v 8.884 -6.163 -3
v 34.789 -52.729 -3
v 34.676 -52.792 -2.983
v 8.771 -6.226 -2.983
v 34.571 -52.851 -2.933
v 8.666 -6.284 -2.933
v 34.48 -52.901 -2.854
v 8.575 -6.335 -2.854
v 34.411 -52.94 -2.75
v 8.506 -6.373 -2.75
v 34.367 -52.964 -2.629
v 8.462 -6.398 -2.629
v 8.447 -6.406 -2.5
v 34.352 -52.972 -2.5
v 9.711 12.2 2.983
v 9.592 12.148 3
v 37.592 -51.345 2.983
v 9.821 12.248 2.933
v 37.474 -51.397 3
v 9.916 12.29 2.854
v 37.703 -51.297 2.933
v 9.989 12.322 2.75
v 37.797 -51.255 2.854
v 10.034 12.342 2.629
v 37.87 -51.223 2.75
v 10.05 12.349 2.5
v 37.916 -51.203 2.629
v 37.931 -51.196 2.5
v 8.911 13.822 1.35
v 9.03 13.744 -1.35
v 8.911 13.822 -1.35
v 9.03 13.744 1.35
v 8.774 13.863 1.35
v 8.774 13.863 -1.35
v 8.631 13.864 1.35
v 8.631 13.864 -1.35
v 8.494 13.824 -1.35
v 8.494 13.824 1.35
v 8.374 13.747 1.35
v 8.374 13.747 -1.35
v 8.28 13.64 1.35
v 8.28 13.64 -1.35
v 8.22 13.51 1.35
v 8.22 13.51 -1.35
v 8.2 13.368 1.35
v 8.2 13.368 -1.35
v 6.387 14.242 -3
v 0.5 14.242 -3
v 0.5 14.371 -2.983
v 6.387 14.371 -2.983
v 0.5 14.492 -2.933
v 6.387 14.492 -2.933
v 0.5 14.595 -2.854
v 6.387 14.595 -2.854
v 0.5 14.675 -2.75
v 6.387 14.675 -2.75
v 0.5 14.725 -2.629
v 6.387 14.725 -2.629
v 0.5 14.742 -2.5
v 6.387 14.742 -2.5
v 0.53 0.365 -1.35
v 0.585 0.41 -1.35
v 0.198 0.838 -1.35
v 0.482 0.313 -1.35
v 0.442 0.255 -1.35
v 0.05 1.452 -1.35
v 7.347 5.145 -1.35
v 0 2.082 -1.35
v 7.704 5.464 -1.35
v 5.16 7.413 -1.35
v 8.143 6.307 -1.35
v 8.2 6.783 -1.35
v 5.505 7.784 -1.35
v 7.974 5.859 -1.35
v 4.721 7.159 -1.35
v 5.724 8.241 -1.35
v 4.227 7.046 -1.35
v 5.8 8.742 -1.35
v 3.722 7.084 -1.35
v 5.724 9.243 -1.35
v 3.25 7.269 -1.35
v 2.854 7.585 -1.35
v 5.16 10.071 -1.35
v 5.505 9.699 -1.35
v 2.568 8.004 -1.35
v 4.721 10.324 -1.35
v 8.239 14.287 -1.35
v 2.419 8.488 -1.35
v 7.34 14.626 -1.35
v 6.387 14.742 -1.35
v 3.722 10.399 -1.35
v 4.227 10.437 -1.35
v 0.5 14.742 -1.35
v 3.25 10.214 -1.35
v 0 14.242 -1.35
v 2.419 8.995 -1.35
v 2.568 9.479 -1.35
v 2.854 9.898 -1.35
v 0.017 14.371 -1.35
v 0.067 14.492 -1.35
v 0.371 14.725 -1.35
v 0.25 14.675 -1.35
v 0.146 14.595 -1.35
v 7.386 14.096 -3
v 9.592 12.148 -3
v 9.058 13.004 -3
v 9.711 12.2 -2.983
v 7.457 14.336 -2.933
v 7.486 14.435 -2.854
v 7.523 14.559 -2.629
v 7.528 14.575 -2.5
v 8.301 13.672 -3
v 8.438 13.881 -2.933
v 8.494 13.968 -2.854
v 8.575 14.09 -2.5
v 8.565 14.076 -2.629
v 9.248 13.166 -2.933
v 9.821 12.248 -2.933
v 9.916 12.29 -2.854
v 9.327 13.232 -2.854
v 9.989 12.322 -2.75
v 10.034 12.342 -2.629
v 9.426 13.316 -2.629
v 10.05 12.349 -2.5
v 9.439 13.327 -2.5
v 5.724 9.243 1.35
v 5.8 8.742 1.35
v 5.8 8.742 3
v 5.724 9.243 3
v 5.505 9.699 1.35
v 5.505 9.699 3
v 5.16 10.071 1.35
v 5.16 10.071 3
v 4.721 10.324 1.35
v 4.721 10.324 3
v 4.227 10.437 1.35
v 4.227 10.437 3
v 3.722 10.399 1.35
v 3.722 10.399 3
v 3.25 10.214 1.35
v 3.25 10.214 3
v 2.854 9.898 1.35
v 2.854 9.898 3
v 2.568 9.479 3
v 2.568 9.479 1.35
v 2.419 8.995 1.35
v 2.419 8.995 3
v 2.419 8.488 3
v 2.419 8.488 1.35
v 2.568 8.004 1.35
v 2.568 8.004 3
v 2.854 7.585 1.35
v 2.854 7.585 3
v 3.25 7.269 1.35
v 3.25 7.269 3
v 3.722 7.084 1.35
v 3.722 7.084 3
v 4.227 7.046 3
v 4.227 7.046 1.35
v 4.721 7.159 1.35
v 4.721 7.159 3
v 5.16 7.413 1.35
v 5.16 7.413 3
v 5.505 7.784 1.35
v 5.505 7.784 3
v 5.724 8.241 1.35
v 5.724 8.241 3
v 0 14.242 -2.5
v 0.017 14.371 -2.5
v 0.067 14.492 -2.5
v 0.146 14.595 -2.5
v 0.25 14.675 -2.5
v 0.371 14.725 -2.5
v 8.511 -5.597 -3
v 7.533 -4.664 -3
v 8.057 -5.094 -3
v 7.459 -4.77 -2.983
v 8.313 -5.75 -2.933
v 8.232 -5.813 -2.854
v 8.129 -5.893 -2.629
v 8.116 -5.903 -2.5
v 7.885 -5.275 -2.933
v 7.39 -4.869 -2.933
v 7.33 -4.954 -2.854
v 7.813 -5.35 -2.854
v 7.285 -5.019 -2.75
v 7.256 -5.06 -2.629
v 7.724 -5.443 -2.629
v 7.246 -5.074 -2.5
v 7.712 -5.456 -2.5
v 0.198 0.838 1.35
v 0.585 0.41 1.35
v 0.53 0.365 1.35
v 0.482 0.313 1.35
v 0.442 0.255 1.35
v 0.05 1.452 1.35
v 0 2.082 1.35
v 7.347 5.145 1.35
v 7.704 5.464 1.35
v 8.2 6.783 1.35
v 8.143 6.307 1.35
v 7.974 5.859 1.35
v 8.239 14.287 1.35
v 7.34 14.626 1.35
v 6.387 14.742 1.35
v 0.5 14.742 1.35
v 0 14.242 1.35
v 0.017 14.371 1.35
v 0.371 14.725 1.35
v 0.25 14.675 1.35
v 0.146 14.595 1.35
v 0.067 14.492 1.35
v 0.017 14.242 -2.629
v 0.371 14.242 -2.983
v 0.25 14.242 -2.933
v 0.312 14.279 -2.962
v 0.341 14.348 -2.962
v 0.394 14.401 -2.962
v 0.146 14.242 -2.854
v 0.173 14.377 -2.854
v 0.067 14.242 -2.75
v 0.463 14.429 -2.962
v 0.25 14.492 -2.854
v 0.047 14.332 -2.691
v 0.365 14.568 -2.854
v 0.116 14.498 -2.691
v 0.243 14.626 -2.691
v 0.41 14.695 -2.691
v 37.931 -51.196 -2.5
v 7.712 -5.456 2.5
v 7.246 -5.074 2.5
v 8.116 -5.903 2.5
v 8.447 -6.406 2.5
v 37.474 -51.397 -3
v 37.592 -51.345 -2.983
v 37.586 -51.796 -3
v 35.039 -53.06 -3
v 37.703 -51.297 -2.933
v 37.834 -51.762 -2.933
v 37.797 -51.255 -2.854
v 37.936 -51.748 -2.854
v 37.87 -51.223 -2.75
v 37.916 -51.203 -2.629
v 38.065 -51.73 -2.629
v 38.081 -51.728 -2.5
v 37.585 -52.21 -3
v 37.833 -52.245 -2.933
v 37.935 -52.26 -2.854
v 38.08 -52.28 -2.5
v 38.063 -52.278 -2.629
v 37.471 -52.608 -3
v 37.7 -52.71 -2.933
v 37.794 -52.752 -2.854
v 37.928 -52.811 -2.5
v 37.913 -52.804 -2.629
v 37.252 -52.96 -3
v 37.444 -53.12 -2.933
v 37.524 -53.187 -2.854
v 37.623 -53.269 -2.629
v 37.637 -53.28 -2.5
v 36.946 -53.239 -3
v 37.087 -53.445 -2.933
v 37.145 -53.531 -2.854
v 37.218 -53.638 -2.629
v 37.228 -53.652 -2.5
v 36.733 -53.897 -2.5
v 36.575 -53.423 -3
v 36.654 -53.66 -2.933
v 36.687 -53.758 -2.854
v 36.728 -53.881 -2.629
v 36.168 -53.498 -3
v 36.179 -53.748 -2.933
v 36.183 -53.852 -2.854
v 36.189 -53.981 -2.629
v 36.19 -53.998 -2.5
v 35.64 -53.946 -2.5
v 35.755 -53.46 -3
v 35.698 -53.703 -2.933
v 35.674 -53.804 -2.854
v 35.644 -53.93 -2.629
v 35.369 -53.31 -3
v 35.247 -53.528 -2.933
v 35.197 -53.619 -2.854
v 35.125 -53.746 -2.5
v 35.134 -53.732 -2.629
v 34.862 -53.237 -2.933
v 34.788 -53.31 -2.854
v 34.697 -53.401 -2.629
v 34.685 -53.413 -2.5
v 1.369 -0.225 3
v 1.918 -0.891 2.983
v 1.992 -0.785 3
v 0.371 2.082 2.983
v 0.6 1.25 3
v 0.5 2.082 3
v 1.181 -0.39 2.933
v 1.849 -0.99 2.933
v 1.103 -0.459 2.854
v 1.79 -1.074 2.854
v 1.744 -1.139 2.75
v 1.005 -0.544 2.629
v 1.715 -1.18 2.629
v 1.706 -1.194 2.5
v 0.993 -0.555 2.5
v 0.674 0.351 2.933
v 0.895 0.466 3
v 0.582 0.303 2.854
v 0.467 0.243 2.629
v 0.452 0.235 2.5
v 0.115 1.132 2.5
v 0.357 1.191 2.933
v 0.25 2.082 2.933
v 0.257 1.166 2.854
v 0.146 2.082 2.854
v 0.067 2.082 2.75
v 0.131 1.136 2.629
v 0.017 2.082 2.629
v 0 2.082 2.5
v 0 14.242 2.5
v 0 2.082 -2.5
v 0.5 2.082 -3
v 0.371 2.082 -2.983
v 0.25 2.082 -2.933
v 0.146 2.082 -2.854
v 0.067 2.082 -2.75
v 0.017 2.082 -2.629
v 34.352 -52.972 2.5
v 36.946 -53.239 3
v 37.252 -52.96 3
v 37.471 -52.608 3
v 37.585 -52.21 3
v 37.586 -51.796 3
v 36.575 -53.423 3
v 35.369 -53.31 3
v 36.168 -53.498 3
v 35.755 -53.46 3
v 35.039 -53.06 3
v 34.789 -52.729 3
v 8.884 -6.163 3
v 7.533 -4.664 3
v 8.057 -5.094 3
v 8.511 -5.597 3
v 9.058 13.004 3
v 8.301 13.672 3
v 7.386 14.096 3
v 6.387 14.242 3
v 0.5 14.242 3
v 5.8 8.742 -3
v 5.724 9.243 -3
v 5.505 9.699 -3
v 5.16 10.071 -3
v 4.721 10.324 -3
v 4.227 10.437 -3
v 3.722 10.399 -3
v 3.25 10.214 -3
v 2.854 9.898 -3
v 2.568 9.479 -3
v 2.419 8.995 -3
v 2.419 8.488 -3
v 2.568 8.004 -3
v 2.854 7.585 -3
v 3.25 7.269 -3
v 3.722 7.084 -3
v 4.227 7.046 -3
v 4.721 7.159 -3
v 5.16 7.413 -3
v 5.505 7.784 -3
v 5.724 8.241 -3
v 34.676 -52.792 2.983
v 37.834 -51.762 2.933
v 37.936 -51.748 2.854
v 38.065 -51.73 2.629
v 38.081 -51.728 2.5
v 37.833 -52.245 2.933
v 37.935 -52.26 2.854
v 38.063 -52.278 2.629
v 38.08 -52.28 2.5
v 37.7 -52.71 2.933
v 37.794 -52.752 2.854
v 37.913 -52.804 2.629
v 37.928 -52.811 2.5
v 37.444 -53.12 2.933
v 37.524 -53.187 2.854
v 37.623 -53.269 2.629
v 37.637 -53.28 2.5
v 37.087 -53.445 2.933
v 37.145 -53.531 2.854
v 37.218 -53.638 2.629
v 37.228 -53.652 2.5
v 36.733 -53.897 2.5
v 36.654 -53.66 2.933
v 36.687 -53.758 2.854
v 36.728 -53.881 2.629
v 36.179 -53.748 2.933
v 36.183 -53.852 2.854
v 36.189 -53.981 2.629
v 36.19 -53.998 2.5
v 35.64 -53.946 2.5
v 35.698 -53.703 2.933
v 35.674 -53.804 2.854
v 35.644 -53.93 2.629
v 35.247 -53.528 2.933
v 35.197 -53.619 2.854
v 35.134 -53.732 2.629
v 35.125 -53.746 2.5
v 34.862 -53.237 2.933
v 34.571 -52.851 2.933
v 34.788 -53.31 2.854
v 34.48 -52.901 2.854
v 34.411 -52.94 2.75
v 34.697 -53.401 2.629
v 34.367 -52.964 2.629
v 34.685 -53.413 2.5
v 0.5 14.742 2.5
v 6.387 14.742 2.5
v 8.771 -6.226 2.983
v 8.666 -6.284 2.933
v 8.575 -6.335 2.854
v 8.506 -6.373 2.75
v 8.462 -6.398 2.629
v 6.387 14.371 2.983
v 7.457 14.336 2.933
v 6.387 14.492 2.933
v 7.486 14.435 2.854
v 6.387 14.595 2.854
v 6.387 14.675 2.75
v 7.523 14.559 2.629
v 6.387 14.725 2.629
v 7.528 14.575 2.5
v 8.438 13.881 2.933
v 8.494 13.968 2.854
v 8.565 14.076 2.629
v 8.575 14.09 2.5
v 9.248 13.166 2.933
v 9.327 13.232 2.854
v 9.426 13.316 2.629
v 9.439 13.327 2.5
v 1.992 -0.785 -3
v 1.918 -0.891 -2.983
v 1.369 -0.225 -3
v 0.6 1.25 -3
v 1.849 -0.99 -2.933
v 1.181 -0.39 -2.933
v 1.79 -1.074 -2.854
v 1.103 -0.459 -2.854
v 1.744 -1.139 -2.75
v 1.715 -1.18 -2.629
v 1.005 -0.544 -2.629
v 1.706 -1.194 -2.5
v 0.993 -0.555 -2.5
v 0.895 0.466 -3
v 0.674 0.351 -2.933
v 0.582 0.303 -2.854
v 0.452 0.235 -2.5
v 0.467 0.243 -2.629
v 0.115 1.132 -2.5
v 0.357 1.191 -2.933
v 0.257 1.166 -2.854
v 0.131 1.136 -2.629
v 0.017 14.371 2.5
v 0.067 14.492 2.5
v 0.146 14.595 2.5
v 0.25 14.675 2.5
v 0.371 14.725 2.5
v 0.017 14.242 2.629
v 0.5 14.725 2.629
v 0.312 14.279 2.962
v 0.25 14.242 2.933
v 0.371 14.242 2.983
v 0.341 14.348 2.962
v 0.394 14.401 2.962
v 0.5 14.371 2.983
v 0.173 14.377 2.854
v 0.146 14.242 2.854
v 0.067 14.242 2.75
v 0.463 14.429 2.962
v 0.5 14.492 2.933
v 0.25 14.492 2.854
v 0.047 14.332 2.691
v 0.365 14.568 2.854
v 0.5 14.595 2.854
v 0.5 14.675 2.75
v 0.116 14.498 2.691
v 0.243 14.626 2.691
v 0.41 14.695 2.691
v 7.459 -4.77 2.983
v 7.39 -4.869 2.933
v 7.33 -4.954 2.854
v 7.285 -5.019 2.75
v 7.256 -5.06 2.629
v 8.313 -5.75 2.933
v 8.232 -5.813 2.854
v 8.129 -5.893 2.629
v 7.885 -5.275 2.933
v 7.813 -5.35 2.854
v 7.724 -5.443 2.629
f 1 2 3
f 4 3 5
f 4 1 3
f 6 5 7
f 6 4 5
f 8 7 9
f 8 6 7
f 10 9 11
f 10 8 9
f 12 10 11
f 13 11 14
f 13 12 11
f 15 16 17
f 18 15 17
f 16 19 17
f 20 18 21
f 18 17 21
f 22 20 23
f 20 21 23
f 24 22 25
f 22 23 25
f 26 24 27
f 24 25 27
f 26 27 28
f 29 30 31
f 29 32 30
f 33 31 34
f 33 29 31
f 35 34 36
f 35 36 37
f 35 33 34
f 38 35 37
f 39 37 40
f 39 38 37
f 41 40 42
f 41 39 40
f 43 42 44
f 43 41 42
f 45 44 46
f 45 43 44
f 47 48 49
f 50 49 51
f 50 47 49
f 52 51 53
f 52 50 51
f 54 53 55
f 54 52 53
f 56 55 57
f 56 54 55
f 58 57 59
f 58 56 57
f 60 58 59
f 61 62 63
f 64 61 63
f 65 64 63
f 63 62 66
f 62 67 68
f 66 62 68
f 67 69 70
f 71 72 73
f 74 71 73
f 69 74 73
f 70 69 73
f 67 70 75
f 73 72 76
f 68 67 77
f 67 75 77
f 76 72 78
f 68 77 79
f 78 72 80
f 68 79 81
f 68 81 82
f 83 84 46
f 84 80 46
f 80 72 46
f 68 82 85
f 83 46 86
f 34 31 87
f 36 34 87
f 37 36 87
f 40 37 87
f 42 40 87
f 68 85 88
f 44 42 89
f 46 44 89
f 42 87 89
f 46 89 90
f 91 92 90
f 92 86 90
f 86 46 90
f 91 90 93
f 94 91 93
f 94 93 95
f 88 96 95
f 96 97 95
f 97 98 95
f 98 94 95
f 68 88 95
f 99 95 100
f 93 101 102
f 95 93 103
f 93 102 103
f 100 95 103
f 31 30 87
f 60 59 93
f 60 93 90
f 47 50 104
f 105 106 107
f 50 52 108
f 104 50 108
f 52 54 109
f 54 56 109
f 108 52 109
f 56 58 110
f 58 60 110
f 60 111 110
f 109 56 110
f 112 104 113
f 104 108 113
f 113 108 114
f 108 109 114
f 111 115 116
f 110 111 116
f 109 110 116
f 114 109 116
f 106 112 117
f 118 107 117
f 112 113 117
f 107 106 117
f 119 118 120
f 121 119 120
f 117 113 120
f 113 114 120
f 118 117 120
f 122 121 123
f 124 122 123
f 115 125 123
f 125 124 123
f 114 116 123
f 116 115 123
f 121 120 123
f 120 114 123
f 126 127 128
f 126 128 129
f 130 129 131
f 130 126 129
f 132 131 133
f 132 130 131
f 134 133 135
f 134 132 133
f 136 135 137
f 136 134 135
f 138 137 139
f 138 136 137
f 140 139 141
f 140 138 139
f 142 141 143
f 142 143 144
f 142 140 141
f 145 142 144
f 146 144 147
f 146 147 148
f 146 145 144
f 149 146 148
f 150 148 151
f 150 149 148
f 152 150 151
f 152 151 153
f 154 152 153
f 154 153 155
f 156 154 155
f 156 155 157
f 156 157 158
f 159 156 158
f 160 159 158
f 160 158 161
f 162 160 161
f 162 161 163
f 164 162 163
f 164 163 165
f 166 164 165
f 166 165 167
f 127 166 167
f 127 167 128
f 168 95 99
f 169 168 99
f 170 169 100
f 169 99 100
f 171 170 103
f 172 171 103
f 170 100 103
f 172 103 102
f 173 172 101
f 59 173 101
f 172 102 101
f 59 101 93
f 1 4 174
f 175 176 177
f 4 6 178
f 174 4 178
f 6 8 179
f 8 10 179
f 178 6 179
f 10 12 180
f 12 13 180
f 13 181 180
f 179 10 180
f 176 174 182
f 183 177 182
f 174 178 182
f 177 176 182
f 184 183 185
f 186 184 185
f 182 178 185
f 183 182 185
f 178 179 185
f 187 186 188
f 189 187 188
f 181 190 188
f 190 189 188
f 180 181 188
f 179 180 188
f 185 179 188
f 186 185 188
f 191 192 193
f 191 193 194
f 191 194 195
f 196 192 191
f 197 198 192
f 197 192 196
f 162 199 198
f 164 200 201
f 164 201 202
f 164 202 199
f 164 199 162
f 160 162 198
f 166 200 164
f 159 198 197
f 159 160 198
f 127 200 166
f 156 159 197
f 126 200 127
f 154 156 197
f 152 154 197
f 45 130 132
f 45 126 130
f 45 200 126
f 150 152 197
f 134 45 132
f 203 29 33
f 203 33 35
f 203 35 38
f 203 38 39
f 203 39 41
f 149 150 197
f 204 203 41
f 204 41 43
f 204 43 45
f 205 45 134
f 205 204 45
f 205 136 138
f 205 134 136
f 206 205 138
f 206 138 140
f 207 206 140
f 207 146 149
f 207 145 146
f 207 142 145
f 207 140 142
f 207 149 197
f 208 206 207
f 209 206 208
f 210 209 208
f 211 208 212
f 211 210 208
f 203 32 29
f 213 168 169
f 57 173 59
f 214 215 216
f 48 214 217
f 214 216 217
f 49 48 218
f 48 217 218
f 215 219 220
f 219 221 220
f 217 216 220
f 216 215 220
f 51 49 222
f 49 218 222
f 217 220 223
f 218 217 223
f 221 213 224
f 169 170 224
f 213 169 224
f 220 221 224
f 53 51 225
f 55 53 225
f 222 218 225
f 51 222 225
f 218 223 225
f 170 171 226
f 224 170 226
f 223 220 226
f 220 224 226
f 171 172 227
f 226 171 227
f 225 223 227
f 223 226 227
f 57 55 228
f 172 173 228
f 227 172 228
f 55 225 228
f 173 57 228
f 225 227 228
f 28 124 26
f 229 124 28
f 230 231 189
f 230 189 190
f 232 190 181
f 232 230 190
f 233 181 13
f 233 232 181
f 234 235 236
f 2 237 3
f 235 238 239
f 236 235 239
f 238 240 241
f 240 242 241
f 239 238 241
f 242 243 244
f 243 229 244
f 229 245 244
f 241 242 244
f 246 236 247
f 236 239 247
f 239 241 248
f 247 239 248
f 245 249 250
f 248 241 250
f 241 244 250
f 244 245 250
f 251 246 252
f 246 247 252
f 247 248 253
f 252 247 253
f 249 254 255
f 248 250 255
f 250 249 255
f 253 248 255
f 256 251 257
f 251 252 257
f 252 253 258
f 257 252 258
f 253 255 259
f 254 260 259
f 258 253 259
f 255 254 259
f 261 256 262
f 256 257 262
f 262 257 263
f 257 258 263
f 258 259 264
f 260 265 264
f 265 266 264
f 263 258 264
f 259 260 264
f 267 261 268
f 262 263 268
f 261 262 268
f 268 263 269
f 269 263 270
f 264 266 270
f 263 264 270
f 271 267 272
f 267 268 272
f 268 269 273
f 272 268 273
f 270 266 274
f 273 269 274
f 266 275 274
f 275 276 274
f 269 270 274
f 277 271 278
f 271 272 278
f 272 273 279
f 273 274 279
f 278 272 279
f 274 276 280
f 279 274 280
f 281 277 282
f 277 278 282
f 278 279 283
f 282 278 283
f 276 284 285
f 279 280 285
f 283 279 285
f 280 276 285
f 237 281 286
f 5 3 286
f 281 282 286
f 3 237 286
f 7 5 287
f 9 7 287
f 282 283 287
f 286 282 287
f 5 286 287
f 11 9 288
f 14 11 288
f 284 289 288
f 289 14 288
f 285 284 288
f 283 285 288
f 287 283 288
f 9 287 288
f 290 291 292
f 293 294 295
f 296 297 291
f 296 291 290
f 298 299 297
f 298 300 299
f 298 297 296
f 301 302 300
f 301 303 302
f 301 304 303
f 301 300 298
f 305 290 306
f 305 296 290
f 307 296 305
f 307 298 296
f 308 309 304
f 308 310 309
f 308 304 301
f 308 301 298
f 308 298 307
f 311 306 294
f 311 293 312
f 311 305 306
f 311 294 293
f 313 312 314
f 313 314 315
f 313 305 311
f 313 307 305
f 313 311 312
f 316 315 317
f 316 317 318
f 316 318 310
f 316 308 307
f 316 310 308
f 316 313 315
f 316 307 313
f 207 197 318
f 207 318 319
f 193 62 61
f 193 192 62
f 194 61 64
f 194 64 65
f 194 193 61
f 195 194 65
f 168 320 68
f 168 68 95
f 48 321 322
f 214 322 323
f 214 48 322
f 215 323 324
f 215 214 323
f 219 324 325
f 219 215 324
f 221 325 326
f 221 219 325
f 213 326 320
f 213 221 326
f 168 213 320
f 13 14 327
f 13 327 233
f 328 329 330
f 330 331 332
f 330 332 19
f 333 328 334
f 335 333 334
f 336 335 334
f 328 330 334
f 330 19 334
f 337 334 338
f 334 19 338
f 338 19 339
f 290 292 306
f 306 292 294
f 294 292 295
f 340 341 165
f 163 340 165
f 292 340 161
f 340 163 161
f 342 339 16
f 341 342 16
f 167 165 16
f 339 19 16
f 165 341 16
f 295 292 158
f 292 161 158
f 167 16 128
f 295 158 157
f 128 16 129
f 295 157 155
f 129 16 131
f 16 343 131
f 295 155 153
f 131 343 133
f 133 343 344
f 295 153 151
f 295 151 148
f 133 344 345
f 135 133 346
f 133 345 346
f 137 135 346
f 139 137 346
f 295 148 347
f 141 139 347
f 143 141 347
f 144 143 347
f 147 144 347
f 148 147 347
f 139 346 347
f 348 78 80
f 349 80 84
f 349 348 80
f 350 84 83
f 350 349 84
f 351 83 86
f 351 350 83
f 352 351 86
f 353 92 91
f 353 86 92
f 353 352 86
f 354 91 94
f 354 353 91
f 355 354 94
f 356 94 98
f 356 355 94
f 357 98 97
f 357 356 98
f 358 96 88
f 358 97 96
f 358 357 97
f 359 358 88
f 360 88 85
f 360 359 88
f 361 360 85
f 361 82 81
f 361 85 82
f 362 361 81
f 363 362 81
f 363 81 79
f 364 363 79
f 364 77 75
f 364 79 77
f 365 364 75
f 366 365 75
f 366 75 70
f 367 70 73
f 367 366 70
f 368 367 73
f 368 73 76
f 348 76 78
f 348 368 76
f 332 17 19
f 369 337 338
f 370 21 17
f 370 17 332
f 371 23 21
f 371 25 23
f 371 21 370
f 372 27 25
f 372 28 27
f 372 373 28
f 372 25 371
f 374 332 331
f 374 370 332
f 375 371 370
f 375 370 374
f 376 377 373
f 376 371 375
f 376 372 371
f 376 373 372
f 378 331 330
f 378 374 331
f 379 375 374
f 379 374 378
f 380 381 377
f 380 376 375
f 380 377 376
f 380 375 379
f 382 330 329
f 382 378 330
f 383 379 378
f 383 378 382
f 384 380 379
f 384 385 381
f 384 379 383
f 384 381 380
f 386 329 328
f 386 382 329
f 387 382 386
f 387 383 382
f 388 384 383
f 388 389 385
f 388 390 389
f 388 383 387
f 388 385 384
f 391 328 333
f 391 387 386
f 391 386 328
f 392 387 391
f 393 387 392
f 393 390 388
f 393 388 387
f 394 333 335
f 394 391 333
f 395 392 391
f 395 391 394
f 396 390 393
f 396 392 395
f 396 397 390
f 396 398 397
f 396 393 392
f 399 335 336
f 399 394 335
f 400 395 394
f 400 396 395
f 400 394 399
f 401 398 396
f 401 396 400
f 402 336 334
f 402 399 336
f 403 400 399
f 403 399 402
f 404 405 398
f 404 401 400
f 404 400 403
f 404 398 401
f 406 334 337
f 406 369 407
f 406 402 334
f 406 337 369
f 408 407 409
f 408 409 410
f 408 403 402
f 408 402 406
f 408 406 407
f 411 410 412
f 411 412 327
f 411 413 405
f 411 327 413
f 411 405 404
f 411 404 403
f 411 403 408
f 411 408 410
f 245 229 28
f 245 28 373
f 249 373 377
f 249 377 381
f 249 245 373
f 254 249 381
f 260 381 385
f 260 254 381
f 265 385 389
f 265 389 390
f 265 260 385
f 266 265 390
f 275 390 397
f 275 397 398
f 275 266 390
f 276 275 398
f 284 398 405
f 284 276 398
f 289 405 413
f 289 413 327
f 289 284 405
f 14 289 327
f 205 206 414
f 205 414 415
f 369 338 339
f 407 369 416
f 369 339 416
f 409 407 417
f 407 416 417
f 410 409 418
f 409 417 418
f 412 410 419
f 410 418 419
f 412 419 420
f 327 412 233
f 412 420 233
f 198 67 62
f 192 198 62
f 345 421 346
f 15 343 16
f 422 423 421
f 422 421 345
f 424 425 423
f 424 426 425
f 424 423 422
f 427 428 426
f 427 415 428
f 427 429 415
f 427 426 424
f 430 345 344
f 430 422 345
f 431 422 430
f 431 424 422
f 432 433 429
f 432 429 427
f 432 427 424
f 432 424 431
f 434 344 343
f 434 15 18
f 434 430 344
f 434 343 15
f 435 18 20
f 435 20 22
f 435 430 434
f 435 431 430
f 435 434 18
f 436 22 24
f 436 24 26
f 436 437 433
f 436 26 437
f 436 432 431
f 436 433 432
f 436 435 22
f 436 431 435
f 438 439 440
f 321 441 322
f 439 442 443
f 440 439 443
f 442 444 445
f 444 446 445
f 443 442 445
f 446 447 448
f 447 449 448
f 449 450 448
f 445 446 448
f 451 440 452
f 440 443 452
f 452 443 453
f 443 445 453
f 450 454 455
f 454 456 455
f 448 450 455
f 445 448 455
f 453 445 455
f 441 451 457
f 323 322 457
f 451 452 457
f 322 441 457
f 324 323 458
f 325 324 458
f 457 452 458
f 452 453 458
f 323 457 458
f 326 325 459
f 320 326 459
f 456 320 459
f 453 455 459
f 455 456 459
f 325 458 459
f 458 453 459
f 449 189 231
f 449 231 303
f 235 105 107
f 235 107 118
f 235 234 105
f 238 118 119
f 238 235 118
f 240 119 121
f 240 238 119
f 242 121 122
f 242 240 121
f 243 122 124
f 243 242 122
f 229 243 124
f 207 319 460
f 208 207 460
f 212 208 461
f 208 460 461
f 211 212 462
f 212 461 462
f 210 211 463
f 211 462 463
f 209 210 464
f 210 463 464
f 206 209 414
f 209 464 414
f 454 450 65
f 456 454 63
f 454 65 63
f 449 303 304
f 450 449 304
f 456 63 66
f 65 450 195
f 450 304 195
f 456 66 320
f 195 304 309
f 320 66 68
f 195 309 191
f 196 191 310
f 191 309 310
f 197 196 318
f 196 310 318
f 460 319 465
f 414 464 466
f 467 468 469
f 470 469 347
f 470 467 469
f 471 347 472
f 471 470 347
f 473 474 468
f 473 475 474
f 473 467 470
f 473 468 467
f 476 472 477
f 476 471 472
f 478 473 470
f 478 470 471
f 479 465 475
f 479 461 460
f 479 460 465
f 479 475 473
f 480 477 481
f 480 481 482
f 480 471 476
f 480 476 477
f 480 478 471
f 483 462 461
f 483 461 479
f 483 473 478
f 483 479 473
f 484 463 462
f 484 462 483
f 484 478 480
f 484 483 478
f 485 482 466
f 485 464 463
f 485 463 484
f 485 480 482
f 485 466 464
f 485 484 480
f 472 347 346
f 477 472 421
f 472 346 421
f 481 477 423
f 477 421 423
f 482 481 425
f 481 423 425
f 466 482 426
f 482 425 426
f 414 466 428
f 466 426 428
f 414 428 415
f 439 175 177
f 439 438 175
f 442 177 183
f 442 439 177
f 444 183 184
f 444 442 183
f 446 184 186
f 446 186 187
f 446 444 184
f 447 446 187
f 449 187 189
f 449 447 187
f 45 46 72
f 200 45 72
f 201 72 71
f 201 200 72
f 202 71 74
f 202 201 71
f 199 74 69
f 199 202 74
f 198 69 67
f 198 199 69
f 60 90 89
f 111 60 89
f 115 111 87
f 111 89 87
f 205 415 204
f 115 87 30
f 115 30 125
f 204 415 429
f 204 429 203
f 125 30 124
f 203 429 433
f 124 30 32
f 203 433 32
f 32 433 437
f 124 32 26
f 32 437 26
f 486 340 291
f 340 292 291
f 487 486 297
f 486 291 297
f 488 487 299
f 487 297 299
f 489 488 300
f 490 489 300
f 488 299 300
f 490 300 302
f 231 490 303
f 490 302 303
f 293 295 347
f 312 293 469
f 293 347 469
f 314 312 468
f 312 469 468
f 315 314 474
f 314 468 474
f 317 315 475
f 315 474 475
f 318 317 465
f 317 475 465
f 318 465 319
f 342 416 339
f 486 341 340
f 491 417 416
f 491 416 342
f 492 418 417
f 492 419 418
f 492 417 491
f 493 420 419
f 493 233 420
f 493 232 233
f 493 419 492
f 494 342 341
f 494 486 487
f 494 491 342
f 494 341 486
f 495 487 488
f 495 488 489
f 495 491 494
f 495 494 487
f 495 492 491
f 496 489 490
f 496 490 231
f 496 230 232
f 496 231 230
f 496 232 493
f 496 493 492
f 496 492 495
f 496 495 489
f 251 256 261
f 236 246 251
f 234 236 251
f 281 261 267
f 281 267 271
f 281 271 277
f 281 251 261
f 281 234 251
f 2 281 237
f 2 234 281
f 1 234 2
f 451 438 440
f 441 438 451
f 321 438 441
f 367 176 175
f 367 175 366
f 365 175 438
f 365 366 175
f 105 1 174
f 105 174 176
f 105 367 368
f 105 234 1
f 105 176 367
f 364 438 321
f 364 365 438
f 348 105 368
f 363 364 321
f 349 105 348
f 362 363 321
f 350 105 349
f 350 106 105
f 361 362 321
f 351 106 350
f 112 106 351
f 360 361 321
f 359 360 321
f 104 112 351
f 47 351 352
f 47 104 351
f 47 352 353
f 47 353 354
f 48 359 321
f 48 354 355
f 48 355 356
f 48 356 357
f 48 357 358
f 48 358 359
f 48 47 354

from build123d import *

# Parameters (mm, degrees)
BOSS_EXTRUDE1_DEPTH      = 3
BOSS_EXTRUDE1_DEPTH_BACK = 3
SKETCH1_R                = 1.7
CUT_EXTRUDE1_DEPTH       = 1.35
CUT_EXTRUDE1_DEPTH_BACK  = 1.35
CUT_EXTRUDE1_START       = -3
FILLET1_R                = 2
FILLET2_R                = 0.5
FILLET3_R                = 4
FILLET4_R                = 4
FILLET5_R                = 4
FILLET6_R                = 0.5
FILLET7_R                = 0.5


with BuildPart() as part:
    # Sketch1 → Boss-Extrude1 (new, two sides: drawn at the far end of the back side and taken through both)
    with BuildSketch(Plane.XY.offset(-BOSS_EXTRUDE1_DEPTH_BACK)):
        with BuildLine():
            Line((0, 0), (0, 14.741701813))
            Line((0, 14.741701813), (9, 14.741701813))
            Line((9, 14.741701813), (37.931461615, -51.19641531))
            ThreePointArc((37.931461615, -51.19641531), (36.98891746, -53.791598658), (34.3522375, -52.972278891))
            Line((34.3522375, -52.972278891), (8, -5.601660306))
            Line((8, -5.601660306), (0, 0))
        make_face()
        with Locations((4.1, 8.741701813)):
            Circle(SKETCH1_R, mode=Mode.SUBTRACT)
    extrude(amount=BOSS_EXTRUDE1_DEPTH + BOSS_EXTRUDE1_DEPTH_BACK)

    # Sketch2 → Cut-Extrude1 (cut, two sides: drawn at the far end of the back side and taken through both)
    with BuildSketch(Plane.XY.offset(3).offset(CUT_EXTRUDE1_START - CUT_EXTRUDE1_DEPTH_BACK)):
        Polygon((0, 0), (0, 14.741701813), (8.2, 14.741701813), (8.2, 5.741701813), align=None)
    extrude(amount=CUT_EXTRUDE1_DEPTH + CUT_EXTRUDE1_DEPTH_BACK, mode=Mode.SUBTRACT)

    # Fillet1
    fillet1_edges = [part.edges().sort_by_distance(p)[0] for p in [
        (8.2, 5.741701813, 0),
    ]]
    fillet(fillet1_edges, radius=FILLET1_R)

    # Fillet2
    fillet2_edges = [part.edges().sort_by_distance(p)[0] for p in [
        (0, 0, 0),
    ]]
    fillet(fillet2_edges, radius=FILLET2_R)

    # Fillet3
    fillet3_edges = [part.edges().sort_by_distance(p)[0] for p in [
        (8, -5.601660306, 0),
    ]]
    fillet(fillet3_edges, radius=FILLET3_R)

    # Fillet4
    # the kernel refuses this fillet: 4 mm, written as the material it takes off along each edge
    with BuildSketch(Plane(origin=(9, 14.741701813, 9.532571038), x_dir=(0.4017923449729062, -0.9157308073452443, 0), z_dir=(0, 0, -1))) as fillet4_piece_1:
        with BuildLine():
            CenterArc((FILLET4_R * 0.653257103757, FILLET4_R), FILLET4_R, 203.690274531, 66.309725469)
            Line((-FILLET4_R * 0.262473703589, FILLET4_R * 0.598207655027), (0, 0))
            Line((0, 0), (FILLET4_R * 0.653257103757, 0))
        make_face()
    extrude(amount=19.065142075, mode=Mode.SUBTRACT)

    # Fillet5
    fillet5_edges = [part.edges().sort_by_distance(p)[0] for p in [
        (0, 0, 2.175),
    ]]
    fillet(fillet5_edges, radius=FILLET5_R)

    # Fillet6
    fillet6_edges = [part.edges().sort_by_distance(p)[0] for p in [
        (0, 14.741701813, -2.175),
        (0, 14.741701813, 2.175),
        (8.2, 14.307221126, 0),
    ]]
    fillet(fillet6_edges, radius=FILLET6_R)

    # Fillet7
    fillet7_edges = [part.edges().sort_by_distance(p)[0] for p in [
        (4.475927023, -3.134077842, 3),
        (0.451956667, 0.235273749, 3),
        (4.475927023, -3.134077842, -3),
        (0.451956667, 0.235273749, -3),
        (0, 8.161985008, -3),
        (0.146446609, 14.595255204, -3),
        (0, 8.161985008, 3),
        (0.146446609, 14.595255204, 3),
        (36.98891746, -53.791598658, -3),
        (23.990678215, -19.423772058, -3),
        (36.98891746, -53.791598658, 3),
        (23.990678215, -19.423772058, 3),
        (21.399808273, -29.689072498, 3),
        (21.399808273, -29.689072498, -3),
        (7.922396855, -5.671641436, 3),
        (7.922396855, -5.671641436, -3),
        (3.443485792, 14.741701813, 3),
        (8.574587008, 14.090483496, 3),
        (3.443485792, 14.741701813, -3),
        (8.574587008, 14.090483496, -3),
    ]]
    fillet(fillet7_edges, radius=FILLET7_R)


solid = part.part
